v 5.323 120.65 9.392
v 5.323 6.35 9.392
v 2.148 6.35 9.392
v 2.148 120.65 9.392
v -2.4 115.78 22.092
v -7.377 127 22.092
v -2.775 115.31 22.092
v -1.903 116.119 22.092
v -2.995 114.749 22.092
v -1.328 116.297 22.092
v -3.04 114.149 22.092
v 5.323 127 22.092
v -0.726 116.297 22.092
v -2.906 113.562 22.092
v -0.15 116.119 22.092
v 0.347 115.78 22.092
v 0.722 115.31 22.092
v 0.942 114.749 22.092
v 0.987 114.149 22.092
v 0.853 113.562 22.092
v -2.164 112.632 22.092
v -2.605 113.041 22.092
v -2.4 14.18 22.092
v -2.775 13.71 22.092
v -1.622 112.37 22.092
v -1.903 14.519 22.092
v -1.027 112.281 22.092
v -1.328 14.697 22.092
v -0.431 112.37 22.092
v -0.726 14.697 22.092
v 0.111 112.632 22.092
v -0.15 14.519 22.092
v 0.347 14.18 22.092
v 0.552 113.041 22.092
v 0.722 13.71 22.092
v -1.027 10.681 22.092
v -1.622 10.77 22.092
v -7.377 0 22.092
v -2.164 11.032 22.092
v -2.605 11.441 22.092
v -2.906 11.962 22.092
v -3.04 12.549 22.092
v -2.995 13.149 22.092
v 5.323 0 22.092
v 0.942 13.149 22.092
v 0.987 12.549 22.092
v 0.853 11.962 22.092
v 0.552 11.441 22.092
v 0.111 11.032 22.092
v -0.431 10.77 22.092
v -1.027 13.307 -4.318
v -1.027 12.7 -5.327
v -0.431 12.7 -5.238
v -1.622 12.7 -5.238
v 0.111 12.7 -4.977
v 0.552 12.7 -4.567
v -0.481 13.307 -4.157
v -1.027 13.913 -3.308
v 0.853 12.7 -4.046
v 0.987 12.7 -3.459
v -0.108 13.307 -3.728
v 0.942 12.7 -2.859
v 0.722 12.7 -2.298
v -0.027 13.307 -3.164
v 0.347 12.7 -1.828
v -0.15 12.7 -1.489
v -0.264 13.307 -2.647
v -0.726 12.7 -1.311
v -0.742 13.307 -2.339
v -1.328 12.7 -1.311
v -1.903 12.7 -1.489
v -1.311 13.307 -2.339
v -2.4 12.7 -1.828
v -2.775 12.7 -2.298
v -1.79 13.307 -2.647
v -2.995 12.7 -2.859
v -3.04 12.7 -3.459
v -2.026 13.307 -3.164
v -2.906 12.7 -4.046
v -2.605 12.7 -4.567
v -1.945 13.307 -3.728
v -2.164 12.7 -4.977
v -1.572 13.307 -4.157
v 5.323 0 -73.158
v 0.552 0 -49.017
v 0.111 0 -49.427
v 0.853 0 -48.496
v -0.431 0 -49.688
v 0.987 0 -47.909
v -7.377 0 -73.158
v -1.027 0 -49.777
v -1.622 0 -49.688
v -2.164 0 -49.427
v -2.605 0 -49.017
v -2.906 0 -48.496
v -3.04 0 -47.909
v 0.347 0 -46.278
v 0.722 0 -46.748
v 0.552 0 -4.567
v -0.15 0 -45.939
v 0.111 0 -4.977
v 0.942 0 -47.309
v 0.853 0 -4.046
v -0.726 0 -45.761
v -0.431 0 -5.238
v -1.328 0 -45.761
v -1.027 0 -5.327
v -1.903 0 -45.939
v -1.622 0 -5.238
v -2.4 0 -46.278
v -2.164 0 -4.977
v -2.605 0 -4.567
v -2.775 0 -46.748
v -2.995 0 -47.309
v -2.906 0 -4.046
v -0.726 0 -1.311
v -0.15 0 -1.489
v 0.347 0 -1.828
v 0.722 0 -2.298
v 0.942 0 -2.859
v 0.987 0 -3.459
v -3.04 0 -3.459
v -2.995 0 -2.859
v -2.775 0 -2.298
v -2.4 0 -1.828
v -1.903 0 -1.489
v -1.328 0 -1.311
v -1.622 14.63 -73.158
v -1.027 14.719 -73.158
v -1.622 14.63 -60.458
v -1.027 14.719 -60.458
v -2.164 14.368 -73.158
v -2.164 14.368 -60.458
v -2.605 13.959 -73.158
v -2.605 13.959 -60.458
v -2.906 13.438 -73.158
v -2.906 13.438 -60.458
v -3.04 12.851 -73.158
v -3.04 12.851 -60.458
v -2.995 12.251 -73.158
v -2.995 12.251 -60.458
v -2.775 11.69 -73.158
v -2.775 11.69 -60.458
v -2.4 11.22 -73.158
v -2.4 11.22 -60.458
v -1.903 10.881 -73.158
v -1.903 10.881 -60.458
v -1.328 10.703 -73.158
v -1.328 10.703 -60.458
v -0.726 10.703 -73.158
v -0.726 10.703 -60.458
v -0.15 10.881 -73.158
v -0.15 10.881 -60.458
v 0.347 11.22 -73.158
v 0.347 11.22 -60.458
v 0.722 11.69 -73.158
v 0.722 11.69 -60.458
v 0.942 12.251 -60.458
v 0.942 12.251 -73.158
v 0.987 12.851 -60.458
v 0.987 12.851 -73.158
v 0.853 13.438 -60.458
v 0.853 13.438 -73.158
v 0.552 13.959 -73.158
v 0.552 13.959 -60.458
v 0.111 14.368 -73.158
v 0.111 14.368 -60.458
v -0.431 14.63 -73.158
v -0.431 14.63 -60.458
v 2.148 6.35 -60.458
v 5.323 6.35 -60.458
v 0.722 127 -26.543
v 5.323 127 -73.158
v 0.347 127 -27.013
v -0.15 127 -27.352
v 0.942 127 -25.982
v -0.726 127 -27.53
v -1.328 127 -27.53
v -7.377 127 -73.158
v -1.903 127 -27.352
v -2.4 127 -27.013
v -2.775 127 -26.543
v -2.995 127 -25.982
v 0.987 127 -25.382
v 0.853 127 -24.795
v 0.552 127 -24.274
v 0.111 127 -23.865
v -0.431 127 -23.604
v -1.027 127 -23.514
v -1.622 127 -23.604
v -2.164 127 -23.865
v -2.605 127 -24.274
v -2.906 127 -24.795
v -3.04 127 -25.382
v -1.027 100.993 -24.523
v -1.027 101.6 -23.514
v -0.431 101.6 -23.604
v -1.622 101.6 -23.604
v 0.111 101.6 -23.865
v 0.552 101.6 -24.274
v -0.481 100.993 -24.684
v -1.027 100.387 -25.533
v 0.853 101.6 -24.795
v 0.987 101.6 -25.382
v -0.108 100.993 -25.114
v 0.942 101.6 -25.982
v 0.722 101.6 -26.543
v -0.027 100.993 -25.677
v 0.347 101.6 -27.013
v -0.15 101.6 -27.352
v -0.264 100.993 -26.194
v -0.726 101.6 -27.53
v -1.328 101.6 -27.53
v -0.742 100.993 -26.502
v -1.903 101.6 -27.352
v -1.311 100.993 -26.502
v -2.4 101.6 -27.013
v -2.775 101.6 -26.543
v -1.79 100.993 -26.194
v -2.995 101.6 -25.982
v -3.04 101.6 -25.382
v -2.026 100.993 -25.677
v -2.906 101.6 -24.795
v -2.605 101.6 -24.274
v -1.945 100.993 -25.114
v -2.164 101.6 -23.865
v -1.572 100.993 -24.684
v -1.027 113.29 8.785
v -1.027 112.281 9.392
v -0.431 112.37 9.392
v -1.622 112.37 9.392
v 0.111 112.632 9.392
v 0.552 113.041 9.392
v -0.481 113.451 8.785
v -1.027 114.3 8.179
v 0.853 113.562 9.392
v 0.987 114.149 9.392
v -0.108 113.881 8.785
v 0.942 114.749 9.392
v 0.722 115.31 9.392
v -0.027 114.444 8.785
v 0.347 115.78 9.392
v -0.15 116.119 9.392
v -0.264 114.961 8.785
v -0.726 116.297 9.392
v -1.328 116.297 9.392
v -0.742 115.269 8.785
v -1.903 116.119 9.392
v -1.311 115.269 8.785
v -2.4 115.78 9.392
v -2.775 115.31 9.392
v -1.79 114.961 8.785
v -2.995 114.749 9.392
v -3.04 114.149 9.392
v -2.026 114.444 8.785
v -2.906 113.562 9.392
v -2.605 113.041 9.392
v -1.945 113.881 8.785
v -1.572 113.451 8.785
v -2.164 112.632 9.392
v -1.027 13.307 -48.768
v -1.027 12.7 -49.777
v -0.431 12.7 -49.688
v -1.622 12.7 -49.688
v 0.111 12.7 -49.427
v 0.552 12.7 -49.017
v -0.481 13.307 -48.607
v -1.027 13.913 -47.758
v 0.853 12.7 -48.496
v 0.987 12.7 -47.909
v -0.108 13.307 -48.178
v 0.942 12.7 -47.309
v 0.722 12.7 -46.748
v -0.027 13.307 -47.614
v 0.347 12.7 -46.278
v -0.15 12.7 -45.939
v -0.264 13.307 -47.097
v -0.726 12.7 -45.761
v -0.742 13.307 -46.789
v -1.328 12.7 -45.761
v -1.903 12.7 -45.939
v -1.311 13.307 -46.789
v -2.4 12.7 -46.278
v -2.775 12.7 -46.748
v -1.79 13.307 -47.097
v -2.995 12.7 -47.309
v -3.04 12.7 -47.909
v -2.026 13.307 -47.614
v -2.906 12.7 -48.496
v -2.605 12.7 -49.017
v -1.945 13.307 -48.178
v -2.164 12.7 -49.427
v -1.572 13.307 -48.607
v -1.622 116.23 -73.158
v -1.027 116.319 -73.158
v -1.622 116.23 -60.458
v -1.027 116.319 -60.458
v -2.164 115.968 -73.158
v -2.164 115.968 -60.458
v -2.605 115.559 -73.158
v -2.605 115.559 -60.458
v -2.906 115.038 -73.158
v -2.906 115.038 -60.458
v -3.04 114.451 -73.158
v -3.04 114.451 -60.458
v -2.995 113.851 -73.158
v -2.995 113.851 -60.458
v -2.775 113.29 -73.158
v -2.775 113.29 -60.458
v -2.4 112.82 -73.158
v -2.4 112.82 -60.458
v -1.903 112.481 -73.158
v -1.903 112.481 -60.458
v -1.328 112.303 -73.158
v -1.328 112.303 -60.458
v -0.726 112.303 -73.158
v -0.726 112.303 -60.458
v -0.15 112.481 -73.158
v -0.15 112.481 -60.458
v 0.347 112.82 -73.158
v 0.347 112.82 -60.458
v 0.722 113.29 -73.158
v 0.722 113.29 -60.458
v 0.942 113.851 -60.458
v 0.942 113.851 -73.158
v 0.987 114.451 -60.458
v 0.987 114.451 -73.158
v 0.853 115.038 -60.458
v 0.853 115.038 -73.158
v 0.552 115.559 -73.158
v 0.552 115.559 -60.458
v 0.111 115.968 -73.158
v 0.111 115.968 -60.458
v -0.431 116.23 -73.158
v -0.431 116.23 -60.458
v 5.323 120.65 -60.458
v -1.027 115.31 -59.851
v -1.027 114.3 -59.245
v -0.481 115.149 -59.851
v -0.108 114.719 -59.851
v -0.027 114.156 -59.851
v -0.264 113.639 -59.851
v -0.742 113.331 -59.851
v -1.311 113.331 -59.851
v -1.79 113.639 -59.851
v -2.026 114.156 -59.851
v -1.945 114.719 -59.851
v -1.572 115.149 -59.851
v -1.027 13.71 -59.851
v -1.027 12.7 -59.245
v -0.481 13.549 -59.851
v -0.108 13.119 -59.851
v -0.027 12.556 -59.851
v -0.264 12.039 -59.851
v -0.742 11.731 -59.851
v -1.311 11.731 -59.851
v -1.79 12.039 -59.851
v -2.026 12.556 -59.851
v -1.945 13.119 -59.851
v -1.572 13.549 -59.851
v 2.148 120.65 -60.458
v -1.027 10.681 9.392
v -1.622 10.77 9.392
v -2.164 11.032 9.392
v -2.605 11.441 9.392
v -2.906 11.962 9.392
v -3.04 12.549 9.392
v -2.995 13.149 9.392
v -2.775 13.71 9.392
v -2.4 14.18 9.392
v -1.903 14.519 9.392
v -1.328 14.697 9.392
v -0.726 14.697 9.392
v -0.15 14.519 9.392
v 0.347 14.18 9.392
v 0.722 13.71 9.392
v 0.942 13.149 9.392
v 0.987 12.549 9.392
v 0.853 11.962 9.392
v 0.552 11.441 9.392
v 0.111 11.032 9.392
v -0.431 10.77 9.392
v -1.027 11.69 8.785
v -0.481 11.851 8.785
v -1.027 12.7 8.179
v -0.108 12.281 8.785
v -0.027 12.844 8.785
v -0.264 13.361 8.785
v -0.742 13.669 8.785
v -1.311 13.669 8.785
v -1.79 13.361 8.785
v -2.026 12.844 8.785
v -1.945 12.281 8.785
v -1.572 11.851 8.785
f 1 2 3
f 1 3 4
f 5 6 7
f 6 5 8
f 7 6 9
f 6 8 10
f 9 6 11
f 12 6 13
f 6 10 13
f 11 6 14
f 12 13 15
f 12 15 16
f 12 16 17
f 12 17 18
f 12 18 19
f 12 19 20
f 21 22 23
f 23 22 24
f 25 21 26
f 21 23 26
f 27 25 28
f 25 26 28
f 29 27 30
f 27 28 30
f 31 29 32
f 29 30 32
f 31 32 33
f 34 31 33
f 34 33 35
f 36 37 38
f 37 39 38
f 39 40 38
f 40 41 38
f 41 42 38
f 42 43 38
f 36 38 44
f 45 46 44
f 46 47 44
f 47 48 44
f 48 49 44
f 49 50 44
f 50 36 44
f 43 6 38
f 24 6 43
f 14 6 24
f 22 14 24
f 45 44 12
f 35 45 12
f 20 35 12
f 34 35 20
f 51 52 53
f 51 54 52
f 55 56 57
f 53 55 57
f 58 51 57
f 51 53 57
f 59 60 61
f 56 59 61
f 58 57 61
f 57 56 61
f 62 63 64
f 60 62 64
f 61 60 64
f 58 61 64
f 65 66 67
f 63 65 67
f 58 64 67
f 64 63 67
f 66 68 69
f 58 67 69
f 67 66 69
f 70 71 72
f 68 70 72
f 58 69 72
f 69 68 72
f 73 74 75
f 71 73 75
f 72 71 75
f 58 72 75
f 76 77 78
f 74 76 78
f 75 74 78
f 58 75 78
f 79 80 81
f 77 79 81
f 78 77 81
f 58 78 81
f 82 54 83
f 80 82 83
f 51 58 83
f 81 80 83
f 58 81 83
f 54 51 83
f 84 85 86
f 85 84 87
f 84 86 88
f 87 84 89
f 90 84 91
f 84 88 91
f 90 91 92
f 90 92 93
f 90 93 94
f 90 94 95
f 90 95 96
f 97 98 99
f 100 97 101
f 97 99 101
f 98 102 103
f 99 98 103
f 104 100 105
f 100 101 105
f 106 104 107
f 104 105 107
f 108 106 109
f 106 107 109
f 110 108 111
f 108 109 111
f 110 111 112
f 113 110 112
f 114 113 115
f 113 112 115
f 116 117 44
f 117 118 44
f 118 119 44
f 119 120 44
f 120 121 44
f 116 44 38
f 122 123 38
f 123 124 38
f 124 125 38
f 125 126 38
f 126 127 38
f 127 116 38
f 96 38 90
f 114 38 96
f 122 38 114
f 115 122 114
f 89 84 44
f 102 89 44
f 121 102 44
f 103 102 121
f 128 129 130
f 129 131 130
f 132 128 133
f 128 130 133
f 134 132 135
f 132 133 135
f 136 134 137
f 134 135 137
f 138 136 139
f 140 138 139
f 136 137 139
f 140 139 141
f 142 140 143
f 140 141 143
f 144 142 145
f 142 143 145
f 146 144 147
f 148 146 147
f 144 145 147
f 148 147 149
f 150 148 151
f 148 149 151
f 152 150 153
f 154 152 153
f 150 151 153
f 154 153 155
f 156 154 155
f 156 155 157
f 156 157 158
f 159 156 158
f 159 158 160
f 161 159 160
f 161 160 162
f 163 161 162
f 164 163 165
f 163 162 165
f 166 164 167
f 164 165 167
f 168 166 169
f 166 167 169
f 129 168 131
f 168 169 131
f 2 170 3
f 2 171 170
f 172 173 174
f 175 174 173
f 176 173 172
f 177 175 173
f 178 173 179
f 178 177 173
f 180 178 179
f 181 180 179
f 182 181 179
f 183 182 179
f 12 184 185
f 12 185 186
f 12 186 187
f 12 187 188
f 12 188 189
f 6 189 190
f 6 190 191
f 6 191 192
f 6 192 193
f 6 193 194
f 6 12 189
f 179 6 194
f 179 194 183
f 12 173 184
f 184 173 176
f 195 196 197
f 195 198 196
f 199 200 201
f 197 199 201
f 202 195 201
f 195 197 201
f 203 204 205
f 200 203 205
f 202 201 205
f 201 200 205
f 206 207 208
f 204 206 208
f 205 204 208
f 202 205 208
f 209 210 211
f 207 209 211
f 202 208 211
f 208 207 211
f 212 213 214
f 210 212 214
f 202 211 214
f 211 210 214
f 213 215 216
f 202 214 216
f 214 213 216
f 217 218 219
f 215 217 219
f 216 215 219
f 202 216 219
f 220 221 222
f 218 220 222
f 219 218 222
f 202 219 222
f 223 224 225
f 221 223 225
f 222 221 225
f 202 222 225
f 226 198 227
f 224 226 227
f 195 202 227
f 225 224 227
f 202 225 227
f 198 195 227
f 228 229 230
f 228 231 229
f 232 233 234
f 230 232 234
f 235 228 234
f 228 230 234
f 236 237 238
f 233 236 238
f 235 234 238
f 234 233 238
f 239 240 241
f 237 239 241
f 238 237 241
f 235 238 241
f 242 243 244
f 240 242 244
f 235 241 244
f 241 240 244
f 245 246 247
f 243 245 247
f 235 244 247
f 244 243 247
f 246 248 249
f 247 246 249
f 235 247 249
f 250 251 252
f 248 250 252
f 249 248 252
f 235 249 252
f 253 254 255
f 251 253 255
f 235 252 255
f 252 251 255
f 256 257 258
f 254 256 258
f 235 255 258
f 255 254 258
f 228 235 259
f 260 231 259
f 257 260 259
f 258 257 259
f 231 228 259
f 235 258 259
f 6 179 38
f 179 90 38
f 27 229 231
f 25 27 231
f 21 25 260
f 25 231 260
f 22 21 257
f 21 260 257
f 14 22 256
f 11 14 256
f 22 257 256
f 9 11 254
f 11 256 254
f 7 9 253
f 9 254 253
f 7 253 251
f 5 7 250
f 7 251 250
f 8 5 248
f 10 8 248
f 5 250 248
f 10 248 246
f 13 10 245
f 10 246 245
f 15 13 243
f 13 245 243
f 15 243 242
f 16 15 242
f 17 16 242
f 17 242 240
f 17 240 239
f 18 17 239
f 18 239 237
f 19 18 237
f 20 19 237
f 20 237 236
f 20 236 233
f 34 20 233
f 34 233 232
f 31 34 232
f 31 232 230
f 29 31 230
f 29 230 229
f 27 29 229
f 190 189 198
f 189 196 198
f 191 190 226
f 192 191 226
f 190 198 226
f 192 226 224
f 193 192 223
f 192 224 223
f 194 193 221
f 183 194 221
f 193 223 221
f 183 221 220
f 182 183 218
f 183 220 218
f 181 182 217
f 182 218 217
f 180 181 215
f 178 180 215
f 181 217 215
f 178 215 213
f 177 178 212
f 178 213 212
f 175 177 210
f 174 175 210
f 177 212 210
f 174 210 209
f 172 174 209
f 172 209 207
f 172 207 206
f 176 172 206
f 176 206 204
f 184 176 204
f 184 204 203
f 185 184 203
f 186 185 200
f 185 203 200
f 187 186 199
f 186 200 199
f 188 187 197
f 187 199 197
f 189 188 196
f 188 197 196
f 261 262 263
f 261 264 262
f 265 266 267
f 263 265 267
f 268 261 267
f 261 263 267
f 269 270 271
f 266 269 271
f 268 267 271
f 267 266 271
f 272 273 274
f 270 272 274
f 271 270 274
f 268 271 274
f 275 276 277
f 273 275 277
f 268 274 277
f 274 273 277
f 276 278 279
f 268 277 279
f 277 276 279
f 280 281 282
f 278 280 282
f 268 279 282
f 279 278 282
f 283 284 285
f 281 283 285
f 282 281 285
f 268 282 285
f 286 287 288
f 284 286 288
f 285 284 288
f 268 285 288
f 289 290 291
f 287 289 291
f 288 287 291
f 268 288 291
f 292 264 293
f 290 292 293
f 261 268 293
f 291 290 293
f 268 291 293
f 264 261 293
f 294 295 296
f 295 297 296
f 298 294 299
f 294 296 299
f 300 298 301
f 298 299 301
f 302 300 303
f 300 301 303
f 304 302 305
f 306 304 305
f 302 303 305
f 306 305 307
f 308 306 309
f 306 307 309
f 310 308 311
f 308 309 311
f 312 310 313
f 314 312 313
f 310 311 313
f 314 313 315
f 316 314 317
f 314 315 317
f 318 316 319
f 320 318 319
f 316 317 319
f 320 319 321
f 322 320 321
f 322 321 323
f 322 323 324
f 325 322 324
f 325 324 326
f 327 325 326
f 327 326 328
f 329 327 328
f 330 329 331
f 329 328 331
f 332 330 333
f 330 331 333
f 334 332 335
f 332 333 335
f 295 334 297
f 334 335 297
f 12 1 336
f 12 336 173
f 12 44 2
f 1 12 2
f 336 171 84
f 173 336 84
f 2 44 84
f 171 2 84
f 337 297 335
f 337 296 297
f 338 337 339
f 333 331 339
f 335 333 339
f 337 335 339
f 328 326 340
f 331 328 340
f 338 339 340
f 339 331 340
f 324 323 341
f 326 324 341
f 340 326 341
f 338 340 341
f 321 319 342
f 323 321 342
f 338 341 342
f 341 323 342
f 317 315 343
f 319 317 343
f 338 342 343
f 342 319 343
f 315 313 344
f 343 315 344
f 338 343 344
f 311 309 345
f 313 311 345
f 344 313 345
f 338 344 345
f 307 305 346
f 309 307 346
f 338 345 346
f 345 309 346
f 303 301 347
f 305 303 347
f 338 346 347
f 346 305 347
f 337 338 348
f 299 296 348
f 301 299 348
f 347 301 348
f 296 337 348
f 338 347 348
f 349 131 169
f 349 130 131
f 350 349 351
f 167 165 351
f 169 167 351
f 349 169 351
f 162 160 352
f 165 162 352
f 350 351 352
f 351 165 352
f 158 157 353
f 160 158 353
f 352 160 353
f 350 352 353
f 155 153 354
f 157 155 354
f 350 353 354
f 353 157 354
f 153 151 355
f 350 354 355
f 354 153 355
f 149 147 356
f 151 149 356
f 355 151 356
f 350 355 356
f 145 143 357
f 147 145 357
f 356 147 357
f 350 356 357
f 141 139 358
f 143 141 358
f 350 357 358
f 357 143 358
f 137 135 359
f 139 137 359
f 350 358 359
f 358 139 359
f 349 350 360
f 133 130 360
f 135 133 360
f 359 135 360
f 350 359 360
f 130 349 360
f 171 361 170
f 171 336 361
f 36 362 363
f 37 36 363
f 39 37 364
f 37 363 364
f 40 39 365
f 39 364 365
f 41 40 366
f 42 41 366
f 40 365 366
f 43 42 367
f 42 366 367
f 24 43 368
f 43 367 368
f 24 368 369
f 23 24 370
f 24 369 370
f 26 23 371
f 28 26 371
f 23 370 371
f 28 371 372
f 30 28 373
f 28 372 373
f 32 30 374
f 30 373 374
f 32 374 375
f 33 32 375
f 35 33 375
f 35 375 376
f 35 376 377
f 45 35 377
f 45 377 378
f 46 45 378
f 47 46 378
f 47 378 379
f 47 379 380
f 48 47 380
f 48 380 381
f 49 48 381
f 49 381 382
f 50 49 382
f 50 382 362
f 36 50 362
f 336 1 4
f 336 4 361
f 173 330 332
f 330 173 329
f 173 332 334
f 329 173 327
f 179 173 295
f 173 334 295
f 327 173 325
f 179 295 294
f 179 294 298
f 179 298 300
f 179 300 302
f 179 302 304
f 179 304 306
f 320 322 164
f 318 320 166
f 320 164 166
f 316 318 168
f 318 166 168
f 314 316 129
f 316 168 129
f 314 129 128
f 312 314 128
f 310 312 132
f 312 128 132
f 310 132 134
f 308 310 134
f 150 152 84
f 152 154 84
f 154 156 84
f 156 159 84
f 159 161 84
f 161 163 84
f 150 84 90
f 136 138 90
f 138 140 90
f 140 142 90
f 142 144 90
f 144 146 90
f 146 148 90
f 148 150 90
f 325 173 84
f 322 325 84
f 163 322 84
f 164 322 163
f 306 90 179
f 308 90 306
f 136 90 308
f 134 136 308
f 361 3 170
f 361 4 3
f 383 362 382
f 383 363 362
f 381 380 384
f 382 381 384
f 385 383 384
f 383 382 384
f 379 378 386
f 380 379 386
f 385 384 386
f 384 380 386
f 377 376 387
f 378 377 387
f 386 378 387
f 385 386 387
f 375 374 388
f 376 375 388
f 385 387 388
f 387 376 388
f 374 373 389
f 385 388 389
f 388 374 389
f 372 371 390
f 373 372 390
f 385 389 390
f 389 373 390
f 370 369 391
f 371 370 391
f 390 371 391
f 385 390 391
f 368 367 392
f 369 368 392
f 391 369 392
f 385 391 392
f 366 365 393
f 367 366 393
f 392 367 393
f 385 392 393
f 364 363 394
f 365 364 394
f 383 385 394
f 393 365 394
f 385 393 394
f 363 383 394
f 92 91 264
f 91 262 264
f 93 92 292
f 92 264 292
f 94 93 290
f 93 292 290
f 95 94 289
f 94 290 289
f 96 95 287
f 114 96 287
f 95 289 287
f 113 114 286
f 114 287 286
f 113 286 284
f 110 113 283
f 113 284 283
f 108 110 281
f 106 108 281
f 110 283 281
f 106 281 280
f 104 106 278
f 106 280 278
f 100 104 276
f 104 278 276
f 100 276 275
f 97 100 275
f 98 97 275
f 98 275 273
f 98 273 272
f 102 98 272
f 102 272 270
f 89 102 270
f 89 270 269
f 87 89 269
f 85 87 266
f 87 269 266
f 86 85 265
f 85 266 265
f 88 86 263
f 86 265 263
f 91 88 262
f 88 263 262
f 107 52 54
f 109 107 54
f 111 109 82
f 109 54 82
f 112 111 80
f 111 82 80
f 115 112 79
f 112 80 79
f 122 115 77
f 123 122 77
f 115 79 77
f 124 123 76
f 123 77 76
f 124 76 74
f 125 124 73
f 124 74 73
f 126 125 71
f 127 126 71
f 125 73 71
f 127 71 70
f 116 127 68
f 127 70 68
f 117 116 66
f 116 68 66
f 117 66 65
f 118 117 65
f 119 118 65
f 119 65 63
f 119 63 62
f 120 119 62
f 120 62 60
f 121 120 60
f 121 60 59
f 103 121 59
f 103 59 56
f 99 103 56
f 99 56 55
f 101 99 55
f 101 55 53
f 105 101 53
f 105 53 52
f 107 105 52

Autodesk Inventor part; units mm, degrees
ref_plane "YZ Plane" through (0, 0, 0) normal (1, 0, 0) x (0, 1, 0)
ref_plane "XZ Plane" through (0, 0, 0) normal (0, 1, 0) x (-1, 0, 0)
ref_plane "XY Plane" through (0, 0, 0) normal (0, 0, 1) x (1, 0, 0)
sketch "Sketch1" plane through (0, 0, 0) normal (0, 1, 0) x (-1, 0, 0)
  line L0 (7.3766, 22.0919) -> (-5.3234, 22.0919)
  line L1 (-5.3234, 22.0919) -> (-5.3234, -73.1581)
  line L2 (-5.3234, -73.1581) -> (7.3766, -73.1581)
  line L3 (7.3766, -73.1581) -> (7.3766, 22.0919)
  point P0 (0, 0)
  dimension "d0" = 12.7
  dimension "d1" = 95.25
extrude "Extrusion1" add sketch "Sketch1" along normal blind 127
sketch "Sketch2" plane through (-7.3766, 0, 22.0919) normal (0, 0, 1) x (1, 0, 0)
  line L0 (12.7, 0) -> (12.7, 127) projected
  line L1 (12.7, 127) -> (0, 127) projected
  line L2 (0, 0) -> (12.7, 0) projected
  line L3 (0, 0) -> (0, 127) projected
  point P0 (7.3766, 0)
  point P1 (6.35, 114.3)
  point P2 (6.35, 12.7)
  dimension "d4" = 6.35
  dimension "d5" = 12.7
  dimension "d6" = 12.7
  dimension "d7" = 6.35
hole "Hole1" at (-1.0266, 114.3, 22.0919) at (-1.0266, 12.7, 22.0919) direction (0, 0, -1) diameter 4.0386 depth 12.7 tip angle 118
sketch "Sketch3" plane through (5.3234, 0, -73.1581) normal (0, 0, -1) x (-1, 0, 0)
  line L0 (0, 0) -> (12.7, 0) projected
  line L1 (12.7, 0) -> (12.7, 127) projected
  line L2 (0, 127) -> (12.7, 127) projected
  point P0 (5.3234, 0)
  point P1 (6.35, 114.3)
  point P2 (6.35, 12.7)
  dimension "d15" = 12.7
  dimension "d16" = 6.35
  dimension "d17" = 6.35
  dimension "d18" = 12.7
hole "Hole2" at (-1.0266, 114.3, -73.1581) at (-1.0266, 12.7, -73.1581) direction (0, 0, 1) diameter 4.0386 depth 12.7 tip angle 118
sketch "Sketch4" plane through (5.3234, 0, 22.0919) normal (1, 0, 0) x (0, 0, -1)
  line L0 (12.7, 120.65) -> (82.55, 120.65)
  line L1 (82.55, 120.65) -> (82.55, 6.35)
  line L2 (82.55, 6.35) -> (12.7, 6.35)
  line L3 (12.7, 6.35) -> (12.7, 120.65)
  line L4 (95.25, 127) -> (0, 127) projected
  line L5 (95.25, 0) -> (0, 0) projected
  line L6 (95.25, 0) -> (95.25, 127) projected
  line L7 (0, 0) -> (0, 127) projected
  point P0 (22.0919, 0)
  dimension "d26" = 6.35
  dimension "d27" = 6.35
  dimension "d28" = 12.7
  dimension "d29" = 12.7
extrude "Extrusion2" cut sketch "Sketch4" against normal blind 3.175 contours L0 L1 L2 L3
sketch "Sketch5" plane through (0, 127, 0) normal (0, 1, 0) x (1, 0, 0)
  line L0 (-7.3766, -22.0919) -> (5.3234, -22.0919) projected
  line L1 (5.3234, 73.1581) -> (-7.3766, 73.1581) projected
  line L2 (-7.3766, 73.1581) -> (-7.3766, -22.0919) projected
  point P0 (0, 0)
  point P1 (-1.0266, 25.5331)
  dimension "d32" = 95.25
  dimension "d33" = 6.35
  dimension "d34" = 47.625
hole "Hole3" at (-1.0266, 127, -25.5331) direction (0, -1, 0) diameter 4.0386 depth 25.4 tip angle 118
sketch "Sketch6" plane through (0, 0, 0) normal (0, -1, 0) x (1, 0, 0)
  line L0 (-7.3766, -73.1581) -> (-7.3766, 22.0919) projected
  line L1 (-7.3766, 22.0919) -> (5.3234, 22.0919) projected
  line L2 (5.3234, -73.1581) -> (-7.3766, -73.1581) projected
  point P0 (0, 0)
  point P1 (-1.0266, -3.3081)
  point P2 (-1.0266, -47.7581)
  dimension "d42" = 6.35
  dimension "d43" = 6.35
  dimension "d44" = 25.4
  dimension "d45" = 25.4
hole "Hole4" at (-1.0266, 0, -3.3081) at (-1.0266, 0, -47.7581) direction (0, 1, 0) diameter 4.0386 depth 12.7 tip angle 118
properties part number "BatteryHighSide"
